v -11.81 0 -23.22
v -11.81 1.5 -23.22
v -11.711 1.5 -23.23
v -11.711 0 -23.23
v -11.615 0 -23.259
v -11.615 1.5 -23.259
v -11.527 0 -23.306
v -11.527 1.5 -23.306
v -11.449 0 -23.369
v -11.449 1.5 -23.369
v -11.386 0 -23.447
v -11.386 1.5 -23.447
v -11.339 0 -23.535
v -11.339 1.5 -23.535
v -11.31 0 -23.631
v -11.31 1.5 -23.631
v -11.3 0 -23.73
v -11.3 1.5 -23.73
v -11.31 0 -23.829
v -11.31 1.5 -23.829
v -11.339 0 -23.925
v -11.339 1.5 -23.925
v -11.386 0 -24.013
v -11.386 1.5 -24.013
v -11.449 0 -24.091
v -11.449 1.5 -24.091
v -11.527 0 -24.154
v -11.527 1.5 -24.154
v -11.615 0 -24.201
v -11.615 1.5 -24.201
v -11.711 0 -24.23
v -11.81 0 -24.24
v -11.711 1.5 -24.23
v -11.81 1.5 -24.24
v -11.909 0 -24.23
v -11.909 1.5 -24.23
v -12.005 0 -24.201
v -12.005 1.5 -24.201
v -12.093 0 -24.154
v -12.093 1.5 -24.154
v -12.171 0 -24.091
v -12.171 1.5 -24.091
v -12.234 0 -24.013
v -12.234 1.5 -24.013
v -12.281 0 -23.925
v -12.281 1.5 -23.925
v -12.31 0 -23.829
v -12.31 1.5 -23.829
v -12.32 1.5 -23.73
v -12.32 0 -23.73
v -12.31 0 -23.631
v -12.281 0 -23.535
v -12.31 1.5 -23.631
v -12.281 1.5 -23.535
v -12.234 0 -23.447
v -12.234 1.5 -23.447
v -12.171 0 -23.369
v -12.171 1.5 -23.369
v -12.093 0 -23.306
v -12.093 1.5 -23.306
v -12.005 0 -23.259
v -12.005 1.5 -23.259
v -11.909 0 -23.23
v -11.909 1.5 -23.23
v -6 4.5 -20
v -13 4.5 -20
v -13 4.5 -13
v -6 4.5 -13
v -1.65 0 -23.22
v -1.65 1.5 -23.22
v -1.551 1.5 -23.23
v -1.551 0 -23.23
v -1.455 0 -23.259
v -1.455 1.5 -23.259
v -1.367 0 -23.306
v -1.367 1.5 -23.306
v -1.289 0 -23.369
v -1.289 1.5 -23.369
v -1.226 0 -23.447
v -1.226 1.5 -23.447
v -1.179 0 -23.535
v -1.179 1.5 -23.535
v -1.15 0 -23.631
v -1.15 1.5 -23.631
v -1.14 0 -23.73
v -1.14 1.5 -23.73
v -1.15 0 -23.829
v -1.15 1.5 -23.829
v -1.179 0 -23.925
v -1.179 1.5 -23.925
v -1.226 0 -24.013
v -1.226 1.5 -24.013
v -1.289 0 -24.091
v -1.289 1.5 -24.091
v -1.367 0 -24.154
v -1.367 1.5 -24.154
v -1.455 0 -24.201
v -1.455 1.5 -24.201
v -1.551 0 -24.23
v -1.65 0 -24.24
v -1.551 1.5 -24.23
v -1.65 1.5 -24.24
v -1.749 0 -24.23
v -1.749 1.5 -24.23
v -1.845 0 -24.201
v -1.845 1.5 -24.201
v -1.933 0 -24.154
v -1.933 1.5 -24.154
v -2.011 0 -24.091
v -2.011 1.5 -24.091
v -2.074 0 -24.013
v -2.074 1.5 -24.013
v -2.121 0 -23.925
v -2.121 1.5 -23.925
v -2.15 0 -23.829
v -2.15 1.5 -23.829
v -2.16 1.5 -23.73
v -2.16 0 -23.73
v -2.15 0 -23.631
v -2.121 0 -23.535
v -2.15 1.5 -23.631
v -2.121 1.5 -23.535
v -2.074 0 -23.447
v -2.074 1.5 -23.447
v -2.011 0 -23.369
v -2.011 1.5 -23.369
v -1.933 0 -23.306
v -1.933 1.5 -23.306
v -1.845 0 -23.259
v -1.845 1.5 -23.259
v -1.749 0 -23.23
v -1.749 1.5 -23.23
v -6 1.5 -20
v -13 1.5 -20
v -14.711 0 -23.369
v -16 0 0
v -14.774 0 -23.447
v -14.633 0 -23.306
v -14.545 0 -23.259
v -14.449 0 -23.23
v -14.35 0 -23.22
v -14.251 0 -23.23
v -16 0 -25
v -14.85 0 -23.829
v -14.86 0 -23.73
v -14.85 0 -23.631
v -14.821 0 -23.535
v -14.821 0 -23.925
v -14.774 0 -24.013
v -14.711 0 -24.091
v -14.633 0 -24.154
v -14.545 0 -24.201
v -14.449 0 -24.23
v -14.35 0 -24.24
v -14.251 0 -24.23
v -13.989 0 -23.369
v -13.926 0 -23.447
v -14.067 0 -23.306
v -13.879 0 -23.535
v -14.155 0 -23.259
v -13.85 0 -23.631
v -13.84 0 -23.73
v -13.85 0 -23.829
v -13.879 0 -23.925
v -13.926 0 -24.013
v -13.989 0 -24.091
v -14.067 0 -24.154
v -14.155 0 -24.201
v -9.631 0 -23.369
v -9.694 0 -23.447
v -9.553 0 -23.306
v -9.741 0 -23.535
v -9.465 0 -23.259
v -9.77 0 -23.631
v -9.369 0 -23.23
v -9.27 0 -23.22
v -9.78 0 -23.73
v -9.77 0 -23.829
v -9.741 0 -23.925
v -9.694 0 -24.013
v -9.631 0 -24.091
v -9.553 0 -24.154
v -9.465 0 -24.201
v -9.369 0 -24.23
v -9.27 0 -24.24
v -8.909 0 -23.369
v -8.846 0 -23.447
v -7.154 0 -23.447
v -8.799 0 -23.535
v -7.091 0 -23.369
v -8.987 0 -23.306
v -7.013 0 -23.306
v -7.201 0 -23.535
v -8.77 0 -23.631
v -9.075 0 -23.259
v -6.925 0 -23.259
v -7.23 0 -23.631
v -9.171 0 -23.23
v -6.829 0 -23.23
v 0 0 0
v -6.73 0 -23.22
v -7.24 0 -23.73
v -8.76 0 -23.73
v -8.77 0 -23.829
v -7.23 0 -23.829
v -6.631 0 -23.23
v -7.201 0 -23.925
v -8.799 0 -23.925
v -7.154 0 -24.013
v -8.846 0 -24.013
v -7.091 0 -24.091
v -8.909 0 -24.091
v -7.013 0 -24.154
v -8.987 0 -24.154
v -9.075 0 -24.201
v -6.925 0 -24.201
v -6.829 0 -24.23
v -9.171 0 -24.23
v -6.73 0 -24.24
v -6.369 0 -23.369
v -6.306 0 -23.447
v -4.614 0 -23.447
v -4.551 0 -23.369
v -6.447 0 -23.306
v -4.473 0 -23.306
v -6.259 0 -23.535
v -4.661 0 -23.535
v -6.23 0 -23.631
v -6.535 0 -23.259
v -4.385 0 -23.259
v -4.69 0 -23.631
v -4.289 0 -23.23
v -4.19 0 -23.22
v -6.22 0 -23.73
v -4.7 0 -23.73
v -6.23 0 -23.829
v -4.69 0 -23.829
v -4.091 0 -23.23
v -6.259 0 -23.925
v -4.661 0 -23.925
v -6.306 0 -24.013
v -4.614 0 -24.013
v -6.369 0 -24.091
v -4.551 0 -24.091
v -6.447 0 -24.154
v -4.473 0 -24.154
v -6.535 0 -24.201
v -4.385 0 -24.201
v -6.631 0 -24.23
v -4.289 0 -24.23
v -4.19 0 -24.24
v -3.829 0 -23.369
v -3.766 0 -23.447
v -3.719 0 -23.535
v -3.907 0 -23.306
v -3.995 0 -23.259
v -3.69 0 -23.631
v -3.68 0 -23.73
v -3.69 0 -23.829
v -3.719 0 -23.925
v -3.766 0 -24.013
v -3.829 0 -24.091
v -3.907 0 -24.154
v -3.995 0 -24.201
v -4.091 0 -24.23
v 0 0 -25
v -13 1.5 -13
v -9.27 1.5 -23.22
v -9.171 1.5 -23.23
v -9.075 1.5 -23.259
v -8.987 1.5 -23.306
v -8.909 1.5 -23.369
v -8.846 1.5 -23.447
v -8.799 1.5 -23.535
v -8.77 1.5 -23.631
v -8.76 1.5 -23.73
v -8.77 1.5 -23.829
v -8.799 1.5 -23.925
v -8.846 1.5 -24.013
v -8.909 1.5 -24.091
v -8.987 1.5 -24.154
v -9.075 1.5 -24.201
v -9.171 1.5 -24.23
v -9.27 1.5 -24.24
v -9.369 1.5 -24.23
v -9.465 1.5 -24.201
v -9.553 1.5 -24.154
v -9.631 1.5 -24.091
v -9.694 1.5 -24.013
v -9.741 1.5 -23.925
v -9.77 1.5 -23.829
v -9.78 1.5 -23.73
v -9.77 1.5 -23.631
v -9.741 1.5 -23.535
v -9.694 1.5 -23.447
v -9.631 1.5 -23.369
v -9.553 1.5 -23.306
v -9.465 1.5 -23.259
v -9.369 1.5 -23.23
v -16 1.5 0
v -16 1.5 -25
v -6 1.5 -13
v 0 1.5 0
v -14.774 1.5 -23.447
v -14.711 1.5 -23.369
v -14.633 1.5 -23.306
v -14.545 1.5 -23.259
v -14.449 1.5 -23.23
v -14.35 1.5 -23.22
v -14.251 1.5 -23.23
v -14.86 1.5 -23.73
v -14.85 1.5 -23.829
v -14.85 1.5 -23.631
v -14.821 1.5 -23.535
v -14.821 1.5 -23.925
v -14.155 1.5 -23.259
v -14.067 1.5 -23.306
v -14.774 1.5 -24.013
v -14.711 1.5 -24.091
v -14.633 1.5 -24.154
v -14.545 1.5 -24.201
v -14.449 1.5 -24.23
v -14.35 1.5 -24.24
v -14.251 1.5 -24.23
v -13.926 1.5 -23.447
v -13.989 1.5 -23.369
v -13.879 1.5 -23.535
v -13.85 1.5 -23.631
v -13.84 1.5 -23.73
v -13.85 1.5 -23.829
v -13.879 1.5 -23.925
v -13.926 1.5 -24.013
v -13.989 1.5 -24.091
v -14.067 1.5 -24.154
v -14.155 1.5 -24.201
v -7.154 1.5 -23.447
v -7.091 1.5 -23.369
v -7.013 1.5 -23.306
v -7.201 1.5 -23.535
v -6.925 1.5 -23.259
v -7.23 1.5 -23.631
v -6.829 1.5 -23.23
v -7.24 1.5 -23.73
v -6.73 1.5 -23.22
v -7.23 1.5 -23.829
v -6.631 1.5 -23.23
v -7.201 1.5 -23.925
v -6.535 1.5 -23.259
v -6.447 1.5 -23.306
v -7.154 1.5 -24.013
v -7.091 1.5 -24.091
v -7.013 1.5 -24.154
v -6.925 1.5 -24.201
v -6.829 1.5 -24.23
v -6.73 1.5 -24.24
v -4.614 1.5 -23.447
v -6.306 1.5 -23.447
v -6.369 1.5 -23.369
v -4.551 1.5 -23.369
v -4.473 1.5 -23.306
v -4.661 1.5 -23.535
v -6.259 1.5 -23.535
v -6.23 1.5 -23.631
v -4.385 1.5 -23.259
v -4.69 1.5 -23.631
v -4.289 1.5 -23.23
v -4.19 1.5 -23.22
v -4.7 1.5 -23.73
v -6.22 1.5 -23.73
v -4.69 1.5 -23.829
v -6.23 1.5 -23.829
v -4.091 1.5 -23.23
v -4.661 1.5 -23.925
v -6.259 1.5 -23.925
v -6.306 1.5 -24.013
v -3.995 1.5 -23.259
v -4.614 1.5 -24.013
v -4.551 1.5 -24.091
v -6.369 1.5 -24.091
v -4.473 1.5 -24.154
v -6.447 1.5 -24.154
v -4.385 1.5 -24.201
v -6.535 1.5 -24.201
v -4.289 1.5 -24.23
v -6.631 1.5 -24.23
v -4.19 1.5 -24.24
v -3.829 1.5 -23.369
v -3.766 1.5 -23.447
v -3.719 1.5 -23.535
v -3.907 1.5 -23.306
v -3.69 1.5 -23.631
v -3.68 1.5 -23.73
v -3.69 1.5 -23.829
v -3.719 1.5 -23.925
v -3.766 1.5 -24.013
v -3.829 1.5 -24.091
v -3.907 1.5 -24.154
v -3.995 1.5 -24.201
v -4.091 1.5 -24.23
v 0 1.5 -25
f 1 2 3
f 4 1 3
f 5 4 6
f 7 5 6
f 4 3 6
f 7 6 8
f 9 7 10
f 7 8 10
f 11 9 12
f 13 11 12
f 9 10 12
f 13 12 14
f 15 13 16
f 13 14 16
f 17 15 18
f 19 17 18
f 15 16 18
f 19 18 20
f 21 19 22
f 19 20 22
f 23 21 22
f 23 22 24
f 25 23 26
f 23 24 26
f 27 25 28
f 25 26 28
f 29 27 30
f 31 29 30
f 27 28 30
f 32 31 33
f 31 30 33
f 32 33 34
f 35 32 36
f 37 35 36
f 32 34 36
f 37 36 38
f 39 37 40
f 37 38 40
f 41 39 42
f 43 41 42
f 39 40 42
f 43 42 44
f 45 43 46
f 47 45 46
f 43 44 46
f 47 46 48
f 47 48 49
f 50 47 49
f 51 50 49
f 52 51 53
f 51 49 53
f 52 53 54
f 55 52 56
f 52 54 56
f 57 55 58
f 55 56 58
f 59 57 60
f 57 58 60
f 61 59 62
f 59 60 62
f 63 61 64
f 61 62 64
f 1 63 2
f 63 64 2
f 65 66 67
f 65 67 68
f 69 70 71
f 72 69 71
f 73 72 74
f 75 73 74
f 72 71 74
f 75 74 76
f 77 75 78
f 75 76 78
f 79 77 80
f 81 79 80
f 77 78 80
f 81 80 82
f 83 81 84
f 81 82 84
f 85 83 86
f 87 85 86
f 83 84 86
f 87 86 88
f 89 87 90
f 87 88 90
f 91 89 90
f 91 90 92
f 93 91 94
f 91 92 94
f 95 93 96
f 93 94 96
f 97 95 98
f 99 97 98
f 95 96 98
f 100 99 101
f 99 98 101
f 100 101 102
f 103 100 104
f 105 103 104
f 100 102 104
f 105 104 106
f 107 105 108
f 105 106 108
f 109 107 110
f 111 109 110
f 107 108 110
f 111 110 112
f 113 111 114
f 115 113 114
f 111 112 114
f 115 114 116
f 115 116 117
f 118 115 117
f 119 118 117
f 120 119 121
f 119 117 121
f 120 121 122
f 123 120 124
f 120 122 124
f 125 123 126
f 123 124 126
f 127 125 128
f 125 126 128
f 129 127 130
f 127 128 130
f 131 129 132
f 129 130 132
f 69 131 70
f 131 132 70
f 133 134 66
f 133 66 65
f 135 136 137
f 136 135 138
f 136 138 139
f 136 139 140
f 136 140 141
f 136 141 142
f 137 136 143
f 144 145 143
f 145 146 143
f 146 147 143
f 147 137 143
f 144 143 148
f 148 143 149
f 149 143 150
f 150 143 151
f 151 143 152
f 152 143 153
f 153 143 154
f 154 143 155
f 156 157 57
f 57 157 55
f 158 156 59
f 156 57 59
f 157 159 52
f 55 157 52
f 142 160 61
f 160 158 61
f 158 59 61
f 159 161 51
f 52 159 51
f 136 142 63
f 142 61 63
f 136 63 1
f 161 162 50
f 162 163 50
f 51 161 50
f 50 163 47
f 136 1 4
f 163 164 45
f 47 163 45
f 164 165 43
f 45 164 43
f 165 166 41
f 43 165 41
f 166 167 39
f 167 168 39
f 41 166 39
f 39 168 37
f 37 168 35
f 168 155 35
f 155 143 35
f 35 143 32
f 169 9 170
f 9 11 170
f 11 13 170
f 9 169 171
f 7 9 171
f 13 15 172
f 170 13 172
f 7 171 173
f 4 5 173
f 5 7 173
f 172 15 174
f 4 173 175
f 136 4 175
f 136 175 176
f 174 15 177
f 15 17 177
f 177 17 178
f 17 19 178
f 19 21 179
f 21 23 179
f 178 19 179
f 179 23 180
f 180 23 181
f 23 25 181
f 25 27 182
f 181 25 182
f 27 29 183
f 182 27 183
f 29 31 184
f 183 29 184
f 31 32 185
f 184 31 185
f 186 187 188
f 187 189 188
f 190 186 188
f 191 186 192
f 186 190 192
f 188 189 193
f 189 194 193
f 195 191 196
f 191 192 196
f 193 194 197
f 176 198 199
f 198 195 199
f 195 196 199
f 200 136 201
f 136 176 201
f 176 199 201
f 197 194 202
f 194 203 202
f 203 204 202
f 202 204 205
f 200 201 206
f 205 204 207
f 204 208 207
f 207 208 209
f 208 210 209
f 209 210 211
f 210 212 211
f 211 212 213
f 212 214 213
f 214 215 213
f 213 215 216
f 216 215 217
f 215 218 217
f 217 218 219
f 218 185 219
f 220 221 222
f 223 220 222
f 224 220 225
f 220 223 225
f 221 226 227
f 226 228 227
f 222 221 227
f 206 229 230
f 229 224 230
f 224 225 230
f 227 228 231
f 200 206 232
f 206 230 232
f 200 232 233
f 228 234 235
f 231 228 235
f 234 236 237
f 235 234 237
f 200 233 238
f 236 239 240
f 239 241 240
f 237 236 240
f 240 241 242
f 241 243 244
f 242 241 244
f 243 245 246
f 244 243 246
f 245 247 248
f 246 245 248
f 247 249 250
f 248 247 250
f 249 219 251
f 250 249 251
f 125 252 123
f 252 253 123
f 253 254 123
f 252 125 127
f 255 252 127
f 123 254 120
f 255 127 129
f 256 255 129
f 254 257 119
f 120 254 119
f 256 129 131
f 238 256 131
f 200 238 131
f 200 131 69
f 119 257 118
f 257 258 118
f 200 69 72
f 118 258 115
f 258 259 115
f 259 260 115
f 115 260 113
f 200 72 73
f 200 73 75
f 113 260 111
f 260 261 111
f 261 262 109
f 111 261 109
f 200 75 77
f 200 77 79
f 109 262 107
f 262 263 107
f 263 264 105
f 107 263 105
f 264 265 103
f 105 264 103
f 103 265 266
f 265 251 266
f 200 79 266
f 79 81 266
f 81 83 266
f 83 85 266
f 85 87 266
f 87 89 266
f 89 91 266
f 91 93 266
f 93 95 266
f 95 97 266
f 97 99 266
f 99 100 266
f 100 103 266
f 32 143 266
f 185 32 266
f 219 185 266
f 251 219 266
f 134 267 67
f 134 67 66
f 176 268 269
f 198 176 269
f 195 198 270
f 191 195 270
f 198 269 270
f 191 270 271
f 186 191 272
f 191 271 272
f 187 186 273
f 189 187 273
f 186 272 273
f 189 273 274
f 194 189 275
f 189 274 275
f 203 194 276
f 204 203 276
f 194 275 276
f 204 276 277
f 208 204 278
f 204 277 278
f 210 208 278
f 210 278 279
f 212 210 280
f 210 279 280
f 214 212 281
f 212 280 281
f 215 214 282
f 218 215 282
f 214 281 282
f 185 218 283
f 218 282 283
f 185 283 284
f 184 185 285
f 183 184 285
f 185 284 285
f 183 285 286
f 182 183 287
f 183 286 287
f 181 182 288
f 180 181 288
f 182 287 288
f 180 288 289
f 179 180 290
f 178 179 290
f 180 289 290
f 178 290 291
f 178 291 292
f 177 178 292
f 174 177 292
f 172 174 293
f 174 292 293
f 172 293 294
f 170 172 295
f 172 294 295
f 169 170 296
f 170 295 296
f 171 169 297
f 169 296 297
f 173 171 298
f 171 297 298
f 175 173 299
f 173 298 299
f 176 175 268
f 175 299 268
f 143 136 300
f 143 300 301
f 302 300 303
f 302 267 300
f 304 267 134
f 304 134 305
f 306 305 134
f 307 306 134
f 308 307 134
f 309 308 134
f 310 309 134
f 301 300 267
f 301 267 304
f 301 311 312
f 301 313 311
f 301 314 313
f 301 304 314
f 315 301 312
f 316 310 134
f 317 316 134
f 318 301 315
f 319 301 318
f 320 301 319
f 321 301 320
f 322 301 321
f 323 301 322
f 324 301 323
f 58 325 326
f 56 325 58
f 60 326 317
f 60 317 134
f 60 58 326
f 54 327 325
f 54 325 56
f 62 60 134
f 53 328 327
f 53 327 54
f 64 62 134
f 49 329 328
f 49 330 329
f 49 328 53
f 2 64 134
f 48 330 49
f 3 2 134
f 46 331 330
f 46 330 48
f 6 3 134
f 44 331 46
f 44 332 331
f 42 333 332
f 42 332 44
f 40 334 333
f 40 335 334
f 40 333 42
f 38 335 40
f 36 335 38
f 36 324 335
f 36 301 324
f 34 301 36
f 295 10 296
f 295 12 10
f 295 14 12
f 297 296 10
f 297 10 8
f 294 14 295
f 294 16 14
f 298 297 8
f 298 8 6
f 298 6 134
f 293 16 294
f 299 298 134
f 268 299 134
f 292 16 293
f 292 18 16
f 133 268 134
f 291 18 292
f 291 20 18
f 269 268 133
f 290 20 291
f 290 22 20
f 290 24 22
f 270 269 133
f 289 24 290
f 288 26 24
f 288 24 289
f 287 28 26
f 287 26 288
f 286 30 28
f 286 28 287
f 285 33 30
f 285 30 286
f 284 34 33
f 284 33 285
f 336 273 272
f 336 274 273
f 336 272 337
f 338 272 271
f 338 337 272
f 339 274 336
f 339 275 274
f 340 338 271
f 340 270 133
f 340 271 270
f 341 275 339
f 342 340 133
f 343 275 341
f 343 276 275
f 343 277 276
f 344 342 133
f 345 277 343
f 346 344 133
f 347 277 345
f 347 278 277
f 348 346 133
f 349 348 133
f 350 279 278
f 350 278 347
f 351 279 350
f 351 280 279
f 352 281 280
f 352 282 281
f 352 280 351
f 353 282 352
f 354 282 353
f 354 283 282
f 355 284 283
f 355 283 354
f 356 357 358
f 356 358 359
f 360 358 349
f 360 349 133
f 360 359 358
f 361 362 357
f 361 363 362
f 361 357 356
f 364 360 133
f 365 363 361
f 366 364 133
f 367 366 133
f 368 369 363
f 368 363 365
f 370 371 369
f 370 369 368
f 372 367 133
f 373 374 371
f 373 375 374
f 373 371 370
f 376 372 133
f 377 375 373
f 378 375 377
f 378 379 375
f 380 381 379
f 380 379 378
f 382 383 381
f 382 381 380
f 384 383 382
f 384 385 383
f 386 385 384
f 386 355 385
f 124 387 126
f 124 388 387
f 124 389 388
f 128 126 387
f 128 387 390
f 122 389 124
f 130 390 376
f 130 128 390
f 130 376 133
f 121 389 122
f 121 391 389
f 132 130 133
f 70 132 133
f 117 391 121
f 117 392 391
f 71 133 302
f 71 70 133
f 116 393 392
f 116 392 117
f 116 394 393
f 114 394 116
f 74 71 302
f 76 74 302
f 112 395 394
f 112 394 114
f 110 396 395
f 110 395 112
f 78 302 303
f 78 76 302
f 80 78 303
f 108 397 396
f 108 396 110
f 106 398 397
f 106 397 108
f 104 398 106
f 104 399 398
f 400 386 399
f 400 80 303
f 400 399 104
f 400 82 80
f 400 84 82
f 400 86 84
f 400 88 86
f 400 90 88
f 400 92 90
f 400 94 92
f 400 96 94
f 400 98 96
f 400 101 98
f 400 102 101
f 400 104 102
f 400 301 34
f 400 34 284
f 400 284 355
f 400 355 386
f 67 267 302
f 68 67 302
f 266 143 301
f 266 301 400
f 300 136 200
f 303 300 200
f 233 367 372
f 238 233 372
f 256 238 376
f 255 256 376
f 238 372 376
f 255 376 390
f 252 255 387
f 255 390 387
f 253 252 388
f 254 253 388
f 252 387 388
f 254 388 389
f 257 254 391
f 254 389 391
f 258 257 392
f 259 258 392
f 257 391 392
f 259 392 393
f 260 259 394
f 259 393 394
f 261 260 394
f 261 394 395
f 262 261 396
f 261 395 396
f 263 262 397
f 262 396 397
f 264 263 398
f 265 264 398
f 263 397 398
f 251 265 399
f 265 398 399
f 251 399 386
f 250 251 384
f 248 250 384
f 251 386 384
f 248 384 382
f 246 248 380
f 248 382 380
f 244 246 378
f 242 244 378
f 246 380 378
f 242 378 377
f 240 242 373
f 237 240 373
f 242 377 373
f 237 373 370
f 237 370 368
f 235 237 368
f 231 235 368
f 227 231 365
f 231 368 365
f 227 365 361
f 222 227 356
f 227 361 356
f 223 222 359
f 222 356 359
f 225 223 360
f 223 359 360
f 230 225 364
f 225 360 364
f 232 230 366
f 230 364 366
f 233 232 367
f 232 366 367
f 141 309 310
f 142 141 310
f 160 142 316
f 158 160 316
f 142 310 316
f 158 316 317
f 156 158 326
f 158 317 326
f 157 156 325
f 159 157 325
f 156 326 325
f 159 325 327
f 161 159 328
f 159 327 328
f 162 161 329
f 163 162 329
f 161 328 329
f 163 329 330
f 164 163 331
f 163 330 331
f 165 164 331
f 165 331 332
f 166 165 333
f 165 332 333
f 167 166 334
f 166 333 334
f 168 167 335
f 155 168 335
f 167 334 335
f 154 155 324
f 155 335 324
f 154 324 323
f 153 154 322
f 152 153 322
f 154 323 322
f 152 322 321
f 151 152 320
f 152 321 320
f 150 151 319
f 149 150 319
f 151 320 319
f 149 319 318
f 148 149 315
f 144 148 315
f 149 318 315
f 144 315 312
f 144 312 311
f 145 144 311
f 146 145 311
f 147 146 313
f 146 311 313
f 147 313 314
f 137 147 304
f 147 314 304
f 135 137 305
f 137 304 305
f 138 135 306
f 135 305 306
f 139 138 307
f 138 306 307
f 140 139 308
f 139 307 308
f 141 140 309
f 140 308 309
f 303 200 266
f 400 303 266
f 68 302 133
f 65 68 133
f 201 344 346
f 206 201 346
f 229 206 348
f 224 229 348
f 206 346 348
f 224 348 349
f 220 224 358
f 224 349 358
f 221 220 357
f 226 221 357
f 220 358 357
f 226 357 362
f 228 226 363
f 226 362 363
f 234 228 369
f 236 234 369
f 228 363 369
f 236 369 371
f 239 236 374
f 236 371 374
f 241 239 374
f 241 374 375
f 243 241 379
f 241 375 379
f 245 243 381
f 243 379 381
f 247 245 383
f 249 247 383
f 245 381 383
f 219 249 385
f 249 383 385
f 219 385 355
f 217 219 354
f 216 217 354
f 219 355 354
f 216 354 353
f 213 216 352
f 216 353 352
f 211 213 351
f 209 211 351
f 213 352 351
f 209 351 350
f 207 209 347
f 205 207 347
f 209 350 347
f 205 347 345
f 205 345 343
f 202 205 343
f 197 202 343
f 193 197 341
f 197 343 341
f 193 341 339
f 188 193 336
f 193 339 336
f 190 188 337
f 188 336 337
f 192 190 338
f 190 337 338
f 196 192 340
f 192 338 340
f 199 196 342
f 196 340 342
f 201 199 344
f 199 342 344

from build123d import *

# Parameters (mm, degrees)
SCHIZZO1_W                   = 16
SCHIZZO1_H                   = 25
ESTRUSIONE_ESTRUSIONE1_DEPTH = 1.5
SCHIZZO2_R                   = 0.51
TAGLIO_ESTRUSIONE1_DEPTH     = 1.5
SCHIZZO3_W                   = 7
SCHIZZO3_H                   = 7
ESTRUSIONE_ESTRUSIONE2_DEPTH = 3


with BuildPart() as part:
    # Schizzo1 → Estrusione-Estrusione1 (new body)
    with BuildSketch(Plane(origin=(0, 0, 0), x_dir=(1, 0, 0), z_dir=(0, 1, 0))):
        with Locations((-8, 12.5)):
            Rectangle(SCHIZZO1_W, SCHIZZO1_H)
    extrude(amount=ESTRUSIONE_ESTRUSIONE1_DEPTH)

    # Schizzo2 → Taglio-Estrusione1 (cut)
    with BuildSketch(Plane(origin=(0, 1.5, 0), x_dir=(1, 0, 0), z_dir=(0, 1, 0))):
        with Locations(Location((-14.35, 23.73, 0), (0, 0, 270))):
            Circle(SCHIZZO2_R)
        with Locations(Location((-11.81, 23.73, 0), (0, 0, 270))):
            Circle(SCHIZZO2_R)
        with Locations(Location((-9.27, 23.73, 0), (0, 0, 270))):
            Circle(SCHIZZO2_R)
        with Locations(Location((-6.73, 23.73, 0), (0, 0, 270))):
            Circle(SCHIZZO2_R)
        with Locations(Location((-4.19, 23.73, 0), (0, 0, 270))):
            Circle(SCHIZZO2_R)
        with Locations(Location((-1.65, 23.73, 0), (0, 0, 270))):
            Circle(SCHIZZO2_R)
    extrude(amount=-TAGLIO_ESTRUSIONE1_DEPTH, mode=Mode.SUBTRACT)

    # Schizzo3 → Estrusione-Estrusione2 (add)
    with BuildSketch(Plane(origin=(0, 1.5, 0), x_dir=(1, 0, 0), z_dir=(0, 1, 0))):
        with Locations((-9.5, 16.5)):
            Rectangle(SCHIZZO3_W, SCHIZZO3_H)
    extrude(amount=ESTRUSIONE_ESTRUSIONE2_DEPTH)


solid = part.part
